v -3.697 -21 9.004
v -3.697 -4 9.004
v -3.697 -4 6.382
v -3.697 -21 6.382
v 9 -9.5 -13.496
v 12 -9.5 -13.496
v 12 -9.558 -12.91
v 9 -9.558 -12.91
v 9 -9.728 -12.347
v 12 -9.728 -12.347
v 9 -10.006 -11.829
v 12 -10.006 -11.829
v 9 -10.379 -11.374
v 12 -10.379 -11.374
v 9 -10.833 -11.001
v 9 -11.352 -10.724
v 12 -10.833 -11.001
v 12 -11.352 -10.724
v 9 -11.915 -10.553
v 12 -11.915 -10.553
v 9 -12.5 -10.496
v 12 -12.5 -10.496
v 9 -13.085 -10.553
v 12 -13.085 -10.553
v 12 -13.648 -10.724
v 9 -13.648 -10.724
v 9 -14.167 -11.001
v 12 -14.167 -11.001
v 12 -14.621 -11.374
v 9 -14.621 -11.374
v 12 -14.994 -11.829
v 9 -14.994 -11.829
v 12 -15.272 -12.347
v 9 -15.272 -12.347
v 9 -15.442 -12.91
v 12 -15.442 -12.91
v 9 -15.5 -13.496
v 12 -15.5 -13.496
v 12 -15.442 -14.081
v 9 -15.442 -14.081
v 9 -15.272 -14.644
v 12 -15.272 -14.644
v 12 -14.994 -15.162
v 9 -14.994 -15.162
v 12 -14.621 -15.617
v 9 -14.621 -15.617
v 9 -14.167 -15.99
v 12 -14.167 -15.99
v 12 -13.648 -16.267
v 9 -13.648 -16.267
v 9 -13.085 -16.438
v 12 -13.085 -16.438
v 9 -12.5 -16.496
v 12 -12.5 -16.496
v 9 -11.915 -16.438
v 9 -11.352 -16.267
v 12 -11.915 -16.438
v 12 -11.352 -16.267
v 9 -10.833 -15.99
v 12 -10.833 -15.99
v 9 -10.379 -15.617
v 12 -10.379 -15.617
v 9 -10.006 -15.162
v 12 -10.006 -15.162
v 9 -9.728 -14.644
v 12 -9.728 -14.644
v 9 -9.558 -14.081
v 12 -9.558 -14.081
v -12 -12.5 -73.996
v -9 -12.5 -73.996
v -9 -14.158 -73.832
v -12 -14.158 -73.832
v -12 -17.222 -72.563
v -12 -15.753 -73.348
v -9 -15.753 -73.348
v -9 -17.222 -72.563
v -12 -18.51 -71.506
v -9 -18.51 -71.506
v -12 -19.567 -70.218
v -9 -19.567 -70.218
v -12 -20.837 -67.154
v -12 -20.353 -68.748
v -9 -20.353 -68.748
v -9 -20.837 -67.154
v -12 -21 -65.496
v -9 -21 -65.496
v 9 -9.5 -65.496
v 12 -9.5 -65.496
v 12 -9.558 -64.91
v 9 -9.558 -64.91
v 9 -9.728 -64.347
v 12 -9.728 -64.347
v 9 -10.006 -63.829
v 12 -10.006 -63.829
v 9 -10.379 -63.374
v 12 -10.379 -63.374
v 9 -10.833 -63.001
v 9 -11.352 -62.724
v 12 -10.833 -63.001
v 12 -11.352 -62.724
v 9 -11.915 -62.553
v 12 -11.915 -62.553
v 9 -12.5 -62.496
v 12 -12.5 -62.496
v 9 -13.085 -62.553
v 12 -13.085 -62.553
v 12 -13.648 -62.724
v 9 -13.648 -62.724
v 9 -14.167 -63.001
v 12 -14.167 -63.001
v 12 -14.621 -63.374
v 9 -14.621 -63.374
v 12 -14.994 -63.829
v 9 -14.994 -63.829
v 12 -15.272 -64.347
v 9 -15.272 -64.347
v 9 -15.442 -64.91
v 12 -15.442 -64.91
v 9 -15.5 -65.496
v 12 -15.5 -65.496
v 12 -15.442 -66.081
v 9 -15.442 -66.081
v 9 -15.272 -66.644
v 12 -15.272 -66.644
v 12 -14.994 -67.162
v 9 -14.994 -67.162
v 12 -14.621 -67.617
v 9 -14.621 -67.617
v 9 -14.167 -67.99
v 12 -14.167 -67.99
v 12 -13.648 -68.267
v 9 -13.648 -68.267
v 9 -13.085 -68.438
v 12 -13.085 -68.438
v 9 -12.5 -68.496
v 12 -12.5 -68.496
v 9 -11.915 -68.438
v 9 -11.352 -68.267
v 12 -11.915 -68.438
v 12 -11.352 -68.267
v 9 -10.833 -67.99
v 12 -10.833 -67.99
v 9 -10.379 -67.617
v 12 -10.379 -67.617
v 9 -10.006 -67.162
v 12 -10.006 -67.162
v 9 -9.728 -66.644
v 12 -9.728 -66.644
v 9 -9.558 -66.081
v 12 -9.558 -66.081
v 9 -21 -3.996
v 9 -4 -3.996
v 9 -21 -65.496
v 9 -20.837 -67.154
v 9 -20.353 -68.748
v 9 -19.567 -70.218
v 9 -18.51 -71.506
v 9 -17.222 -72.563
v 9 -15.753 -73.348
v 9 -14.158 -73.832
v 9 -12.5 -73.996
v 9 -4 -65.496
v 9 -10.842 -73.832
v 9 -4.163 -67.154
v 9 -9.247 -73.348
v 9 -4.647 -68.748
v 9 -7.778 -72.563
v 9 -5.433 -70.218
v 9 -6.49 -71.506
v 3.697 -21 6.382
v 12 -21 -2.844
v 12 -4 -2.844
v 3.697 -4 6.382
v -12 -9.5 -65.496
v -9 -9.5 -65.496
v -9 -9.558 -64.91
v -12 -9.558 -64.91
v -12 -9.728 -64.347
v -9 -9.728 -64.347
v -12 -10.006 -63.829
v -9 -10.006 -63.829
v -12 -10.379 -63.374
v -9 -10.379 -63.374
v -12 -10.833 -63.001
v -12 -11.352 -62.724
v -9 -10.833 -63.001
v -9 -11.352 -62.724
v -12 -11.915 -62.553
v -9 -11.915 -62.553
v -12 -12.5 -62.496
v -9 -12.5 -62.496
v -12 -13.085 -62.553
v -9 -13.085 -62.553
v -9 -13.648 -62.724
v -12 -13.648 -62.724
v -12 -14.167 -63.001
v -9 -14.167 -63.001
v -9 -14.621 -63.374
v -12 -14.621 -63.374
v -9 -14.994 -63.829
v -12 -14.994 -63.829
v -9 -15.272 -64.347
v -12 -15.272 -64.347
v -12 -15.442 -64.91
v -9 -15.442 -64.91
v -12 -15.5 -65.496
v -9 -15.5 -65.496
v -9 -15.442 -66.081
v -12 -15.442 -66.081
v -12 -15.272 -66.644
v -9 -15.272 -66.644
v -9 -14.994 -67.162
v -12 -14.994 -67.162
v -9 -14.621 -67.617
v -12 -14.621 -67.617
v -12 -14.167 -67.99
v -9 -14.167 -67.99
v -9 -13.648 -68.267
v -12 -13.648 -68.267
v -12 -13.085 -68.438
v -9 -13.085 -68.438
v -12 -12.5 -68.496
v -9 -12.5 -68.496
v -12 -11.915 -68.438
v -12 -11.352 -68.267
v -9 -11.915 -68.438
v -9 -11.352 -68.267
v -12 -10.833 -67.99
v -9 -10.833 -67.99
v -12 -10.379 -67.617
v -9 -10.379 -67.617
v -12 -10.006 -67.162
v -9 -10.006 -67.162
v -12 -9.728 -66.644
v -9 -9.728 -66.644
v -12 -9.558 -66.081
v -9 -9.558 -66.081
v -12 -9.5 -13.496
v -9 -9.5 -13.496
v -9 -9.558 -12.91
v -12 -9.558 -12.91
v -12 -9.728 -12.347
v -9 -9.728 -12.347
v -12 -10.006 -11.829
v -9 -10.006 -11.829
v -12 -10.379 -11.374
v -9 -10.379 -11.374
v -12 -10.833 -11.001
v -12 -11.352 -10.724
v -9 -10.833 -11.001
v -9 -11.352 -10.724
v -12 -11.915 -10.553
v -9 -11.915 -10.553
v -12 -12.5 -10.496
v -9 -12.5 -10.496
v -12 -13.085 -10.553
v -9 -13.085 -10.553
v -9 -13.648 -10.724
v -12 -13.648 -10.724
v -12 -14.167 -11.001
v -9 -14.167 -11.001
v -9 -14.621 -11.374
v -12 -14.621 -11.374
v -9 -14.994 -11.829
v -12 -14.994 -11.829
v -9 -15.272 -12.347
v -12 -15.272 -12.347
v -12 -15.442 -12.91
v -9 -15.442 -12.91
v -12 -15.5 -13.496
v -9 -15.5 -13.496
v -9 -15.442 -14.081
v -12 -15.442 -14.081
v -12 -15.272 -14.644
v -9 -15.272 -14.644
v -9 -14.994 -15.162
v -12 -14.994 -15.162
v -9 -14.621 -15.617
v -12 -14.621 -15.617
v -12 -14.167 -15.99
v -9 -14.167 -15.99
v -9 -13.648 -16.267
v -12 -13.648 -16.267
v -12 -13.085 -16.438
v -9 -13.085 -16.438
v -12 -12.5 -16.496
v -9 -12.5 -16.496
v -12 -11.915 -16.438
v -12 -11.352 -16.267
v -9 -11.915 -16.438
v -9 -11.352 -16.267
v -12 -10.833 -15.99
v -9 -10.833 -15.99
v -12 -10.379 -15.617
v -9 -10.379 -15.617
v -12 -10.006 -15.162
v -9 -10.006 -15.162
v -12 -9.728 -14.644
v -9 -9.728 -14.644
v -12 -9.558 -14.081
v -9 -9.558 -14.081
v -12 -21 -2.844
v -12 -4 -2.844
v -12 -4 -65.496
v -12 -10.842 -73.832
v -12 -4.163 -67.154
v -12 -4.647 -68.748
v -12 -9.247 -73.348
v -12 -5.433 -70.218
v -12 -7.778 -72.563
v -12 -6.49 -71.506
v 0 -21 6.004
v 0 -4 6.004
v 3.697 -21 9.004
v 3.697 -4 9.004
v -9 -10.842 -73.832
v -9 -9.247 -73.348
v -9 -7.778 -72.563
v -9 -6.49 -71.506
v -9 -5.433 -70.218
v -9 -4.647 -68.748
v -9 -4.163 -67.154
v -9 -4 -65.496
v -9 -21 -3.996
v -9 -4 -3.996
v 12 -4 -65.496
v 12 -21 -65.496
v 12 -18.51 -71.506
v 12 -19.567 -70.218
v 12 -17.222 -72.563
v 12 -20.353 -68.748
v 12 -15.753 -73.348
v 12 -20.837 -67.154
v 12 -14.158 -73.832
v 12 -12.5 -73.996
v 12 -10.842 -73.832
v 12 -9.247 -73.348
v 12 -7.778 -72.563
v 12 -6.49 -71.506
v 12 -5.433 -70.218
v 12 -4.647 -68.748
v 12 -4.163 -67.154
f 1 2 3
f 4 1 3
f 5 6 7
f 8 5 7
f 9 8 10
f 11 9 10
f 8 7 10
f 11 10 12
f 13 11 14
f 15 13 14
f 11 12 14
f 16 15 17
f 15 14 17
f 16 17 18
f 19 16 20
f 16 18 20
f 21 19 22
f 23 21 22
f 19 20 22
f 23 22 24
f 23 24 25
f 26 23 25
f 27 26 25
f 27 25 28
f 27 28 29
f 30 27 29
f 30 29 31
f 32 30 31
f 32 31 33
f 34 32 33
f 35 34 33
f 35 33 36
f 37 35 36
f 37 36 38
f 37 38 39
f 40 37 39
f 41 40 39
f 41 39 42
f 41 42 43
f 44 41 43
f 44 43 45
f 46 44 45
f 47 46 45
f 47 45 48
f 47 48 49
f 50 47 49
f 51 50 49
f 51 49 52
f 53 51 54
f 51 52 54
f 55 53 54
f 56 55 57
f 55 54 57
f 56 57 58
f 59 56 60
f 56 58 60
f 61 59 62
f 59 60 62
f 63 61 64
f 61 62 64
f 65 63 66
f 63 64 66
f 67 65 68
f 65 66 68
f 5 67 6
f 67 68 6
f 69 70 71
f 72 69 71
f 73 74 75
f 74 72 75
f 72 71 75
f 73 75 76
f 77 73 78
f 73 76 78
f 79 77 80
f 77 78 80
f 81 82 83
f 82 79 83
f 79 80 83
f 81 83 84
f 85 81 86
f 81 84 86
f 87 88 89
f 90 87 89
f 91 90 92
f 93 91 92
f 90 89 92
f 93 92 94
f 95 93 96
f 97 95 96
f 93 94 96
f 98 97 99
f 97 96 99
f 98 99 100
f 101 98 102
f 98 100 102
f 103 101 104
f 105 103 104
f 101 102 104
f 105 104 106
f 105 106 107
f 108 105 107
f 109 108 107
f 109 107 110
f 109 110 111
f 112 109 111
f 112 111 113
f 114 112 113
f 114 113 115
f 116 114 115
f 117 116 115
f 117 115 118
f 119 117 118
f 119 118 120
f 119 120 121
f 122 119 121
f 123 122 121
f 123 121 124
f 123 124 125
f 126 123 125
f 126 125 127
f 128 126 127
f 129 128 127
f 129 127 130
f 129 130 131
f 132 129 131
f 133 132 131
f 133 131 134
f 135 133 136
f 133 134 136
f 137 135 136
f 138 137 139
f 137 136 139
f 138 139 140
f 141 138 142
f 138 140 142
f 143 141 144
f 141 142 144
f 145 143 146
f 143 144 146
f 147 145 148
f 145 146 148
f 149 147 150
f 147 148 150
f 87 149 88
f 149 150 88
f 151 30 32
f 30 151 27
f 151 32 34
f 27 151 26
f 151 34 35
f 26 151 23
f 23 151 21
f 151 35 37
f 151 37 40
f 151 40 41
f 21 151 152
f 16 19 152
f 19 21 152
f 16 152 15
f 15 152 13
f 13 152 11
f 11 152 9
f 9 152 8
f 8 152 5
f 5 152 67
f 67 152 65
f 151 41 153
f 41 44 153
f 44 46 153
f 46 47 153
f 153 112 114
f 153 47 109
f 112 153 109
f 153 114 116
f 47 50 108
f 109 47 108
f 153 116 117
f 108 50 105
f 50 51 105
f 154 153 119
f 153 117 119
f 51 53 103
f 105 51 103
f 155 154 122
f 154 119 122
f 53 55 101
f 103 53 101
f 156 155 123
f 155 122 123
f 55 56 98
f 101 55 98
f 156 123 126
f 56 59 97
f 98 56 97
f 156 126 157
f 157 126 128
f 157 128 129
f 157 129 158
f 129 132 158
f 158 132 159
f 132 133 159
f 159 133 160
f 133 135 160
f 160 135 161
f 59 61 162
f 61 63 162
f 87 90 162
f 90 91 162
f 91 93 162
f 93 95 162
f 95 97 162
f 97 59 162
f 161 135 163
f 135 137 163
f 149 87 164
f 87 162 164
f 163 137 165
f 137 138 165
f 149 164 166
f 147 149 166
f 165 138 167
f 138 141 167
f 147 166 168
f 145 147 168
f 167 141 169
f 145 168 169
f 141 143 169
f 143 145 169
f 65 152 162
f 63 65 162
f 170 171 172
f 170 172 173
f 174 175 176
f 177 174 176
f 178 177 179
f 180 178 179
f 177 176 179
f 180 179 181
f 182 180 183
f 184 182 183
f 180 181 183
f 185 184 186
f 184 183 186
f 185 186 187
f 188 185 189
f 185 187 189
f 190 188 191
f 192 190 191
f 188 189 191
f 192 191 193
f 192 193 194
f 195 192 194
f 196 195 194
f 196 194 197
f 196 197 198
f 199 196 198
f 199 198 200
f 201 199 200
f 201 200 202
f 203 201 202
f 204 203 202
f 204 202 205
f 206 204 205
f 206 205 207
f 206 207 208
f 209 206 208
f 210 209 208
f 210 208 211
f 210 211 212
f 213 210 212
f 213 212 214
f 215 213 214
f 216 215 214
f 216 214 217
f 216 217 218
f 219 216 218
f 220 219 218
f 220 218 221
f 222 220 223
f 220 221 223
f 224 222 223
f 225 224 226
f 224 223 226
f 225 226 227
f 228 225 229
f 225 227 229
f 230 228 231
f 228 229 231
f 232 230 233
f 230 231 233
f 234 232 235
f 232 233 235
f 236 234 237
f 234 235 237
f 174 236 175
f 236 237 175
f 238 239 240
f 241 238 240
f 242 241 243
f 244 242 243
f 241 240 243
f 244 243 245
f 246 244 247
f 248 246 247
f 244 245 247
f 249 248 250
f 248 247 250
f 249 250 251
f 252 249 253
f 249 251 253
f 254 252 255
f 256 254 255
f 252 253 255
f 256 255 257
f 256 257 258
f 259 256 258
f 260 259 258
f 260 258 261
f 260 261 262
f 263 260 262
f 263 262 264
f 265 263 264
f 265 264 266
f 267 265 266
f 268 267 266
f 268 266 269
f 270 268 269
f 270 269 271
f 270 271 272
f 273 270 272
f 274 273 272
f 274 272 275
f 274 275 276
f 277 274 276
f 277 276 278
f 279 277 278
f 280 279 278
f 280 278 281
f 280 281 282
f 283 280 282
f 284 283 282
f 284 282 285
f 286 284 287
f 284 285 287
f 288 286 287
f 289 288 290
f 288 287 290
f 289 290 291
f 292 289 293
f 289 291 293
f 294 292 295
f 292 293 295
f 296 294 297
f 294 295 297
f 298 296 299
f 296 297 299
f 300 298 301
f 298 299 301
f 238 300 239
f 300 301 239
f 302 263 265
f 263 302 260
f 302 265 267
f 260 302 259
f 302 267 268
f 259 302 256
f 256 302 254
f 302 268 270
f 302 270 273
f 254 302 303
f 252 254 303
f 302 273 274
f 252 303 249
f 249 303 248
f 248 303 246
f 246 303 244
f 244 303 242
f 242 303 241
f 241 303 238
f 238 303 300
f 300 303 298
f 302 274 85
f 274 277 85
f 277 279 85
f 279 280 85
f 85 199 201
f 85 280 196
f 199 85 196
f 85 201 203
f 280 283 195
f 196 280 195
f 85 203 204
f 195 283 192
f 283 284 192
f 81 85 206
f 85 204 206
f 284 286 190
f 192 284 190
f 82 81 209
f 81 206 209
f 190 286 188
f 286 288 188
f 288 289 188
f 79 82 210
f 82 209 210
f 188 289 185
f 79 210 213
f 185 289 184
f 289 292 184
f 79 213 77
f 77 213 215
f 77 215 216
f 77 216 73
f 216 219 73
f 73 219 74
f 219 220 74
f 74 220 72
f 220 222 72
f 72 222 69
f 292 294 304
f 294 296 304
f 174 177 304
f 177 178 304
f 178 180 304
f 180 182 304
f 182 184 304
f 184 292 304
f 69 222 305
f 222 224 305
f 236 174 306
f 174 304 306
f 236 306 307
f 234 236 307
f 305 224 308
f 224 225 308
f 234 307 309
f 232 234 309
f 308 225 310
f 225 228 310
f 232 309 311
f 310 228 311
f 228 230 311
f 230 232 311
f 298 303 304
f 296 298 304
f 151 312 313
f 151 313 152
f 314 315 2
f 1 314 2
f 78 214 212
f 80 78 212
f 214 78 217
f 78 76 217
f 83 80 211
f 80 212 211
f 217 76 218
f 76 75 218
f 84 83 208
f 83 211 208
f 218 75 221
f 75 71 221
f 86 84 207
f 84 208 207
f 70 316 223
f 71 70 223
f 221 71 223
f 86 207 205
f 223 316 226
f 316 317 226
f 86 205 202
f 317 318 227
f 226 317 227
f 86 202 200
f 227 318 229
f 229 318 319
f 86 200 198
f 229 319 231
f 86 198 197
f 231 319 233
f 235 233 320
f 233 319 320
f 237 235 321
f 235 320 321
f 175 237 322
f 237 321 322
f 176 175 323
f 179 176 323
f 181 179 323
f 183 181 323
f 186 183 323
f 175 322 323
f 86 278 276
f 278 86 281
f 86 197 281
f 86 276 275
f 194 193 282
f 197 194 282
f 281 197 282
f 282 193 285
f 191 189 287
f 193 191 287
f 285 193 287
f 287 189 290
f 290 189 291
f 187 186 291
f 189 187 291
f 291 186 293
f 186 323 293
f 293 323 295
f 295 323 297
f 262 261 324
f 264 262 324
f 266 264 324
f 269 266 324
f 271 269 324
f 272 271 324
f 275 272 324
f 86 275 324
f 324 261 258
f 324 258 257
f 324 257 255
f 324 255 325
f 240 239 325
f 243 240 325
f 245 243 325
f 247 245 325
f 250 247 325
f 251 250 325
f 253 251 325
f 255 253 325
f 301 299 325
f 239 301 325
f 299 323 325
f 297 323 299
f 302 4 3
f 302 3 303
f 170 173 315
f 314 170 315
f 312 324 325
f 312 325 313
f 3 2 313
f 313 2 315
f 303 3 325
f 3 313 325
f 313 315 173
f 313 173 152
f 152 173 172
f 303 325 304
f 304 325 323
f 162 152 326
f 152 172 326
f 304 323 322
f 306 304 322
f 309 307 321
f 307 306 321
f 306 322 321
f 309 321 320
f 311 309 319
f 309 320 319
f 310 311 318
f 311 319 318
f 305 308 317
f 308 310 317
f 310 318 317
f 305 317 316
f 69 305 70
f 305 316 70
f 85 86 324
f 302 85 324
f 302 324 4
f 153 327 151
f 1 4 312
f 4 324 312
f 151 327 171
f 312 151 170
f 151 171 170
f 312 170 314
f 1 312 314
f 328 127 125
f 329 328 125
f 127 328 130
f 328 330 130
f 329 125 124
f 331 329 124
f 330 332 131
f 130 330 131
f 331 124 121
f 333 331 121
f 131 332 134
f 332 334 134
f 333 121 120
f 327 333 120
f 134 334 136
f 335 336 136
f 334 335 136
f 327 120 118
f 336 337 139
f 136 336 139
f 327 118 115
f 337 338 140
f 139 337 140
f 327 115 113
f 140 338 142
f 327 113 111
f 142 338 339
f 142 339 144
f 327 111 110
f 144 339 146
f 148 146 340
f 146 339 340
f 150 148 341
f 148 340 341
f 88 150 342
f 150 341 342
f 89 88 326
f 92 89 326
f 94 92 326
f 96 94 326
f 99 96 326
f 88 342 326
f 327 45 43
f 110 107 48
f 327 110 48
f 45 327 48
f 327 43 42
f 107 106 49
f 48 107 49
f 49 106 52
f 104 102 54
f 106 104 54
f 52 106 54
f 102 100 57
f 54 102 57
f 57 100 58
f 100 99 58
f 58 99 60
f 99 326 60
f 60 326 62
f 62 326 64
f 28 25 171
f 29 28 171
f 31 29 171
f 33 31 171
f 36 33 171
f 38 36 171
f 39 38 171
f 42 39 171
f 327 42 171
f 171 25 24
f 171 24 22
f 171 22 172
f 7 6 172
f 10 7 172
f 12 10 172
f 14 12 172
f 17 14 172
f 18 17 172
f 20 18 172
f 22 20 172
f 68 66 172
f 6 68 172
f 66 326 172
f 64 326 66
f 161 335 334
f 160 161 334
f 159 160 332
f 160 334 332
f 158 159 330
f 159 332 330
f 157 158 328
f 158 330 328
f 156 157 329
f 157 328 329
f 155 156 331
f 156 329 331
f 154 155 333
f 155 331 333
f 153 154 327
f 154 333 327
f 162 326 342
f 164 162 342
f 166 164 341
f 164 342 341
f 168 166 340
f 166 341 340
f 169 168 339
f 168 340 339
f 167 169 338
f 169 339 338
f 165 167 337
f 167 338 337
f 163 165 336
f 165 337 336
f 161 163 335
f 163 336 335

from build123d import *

# Parameters (mm, degrees)
F1_DEPTH = 25
F2_W     = 4
F2_H     = 71.1512080157
F3_DEPTH = 25
F4_R     = 3
F5_DEPTH = 25


with BuildPart() as f1:
    # F0 (on Front) → F1 (new body)
    with BuildSketch(Plane.XZ):
        Polygon((9, -73.9955009194), (12, -73.9955009194), (12, -2.8442929037), (3.6967449024, 6.3815460937), (3.6967449024, 9.0044990806), (-3.6967449024, 9.0044990806), (-3.6967449024, 6.3815460937), (-12, -2.8442929037), (-12, -73.9955009194), (-9, -73.9955009194), (-9, -3.9955009194), (0, 6.0044990806), (9, -3.9955009194), align=None)
    extrude(amount=F1_DEPTH)

    # F2 (on face) → F3 (cut)
    with BuildSketch(Plane.YZ.offset(12)):
        with Locations((-23, -38.4198969115)):
            Rectangle(F2_W, F2_H)
        with Locations((-2, -38.4198969115)):
            Rectangle(F2_W, F2_H)
        Polygon((-4, 9.0044990806), (-4, -2.8442929037), (0, -2.8442929037), (0, -73.9955009194), (3.3893596847, -73.9955009194), (3.3893596847, 9.0044990806), align=None)
        Polygon((-25, -2.8442929037), (-21, -2.8442929037), (-21, 9.0044990806), (-27.9794055969, 9.0044990806), (-27.9794055969, -73.9955009194), (-25, -73.9955009194), align=None)
    extrude(amount=-F3_DEPTH, mode=Mode.SUBTRACT)

    # F4 (on face) → F5 (cut)
    with BuildSketch(Plane.YZ.offset(12)):
        with BuildLine():
            ThreePointArc((-12.5, -73.9955009194), (-18.5104076401, -71.5059085594), (-21, -65.4955009194))
            Line((-21, -65.4955009194), (-21, -73.9955009194))
            Line((-21, -73.9955009194), (-12.5, -73.9955009194))
        make_face()
        with BuildLine():
            ThreePointArc((-4, -65.4955009194), (-6.4895923599, -71.5059085594), (-12.5, -73.9955009194))
            Line((-12.5, -73.9955009194), (-4, -73.9955009194))
            Line((-4, -73.9955009194), (-4, -65.4955009194))
        make_face()
        with Locations((-12.5, -65.4955009194)):
            Circle(F4_R)
        with Locations((-12.5, -13.4955009194)):
            Circle(F4_R)
    extrude(amount=-F5_DEPTH, mode=Mode.SUBTRACT)


solid = f1.part
